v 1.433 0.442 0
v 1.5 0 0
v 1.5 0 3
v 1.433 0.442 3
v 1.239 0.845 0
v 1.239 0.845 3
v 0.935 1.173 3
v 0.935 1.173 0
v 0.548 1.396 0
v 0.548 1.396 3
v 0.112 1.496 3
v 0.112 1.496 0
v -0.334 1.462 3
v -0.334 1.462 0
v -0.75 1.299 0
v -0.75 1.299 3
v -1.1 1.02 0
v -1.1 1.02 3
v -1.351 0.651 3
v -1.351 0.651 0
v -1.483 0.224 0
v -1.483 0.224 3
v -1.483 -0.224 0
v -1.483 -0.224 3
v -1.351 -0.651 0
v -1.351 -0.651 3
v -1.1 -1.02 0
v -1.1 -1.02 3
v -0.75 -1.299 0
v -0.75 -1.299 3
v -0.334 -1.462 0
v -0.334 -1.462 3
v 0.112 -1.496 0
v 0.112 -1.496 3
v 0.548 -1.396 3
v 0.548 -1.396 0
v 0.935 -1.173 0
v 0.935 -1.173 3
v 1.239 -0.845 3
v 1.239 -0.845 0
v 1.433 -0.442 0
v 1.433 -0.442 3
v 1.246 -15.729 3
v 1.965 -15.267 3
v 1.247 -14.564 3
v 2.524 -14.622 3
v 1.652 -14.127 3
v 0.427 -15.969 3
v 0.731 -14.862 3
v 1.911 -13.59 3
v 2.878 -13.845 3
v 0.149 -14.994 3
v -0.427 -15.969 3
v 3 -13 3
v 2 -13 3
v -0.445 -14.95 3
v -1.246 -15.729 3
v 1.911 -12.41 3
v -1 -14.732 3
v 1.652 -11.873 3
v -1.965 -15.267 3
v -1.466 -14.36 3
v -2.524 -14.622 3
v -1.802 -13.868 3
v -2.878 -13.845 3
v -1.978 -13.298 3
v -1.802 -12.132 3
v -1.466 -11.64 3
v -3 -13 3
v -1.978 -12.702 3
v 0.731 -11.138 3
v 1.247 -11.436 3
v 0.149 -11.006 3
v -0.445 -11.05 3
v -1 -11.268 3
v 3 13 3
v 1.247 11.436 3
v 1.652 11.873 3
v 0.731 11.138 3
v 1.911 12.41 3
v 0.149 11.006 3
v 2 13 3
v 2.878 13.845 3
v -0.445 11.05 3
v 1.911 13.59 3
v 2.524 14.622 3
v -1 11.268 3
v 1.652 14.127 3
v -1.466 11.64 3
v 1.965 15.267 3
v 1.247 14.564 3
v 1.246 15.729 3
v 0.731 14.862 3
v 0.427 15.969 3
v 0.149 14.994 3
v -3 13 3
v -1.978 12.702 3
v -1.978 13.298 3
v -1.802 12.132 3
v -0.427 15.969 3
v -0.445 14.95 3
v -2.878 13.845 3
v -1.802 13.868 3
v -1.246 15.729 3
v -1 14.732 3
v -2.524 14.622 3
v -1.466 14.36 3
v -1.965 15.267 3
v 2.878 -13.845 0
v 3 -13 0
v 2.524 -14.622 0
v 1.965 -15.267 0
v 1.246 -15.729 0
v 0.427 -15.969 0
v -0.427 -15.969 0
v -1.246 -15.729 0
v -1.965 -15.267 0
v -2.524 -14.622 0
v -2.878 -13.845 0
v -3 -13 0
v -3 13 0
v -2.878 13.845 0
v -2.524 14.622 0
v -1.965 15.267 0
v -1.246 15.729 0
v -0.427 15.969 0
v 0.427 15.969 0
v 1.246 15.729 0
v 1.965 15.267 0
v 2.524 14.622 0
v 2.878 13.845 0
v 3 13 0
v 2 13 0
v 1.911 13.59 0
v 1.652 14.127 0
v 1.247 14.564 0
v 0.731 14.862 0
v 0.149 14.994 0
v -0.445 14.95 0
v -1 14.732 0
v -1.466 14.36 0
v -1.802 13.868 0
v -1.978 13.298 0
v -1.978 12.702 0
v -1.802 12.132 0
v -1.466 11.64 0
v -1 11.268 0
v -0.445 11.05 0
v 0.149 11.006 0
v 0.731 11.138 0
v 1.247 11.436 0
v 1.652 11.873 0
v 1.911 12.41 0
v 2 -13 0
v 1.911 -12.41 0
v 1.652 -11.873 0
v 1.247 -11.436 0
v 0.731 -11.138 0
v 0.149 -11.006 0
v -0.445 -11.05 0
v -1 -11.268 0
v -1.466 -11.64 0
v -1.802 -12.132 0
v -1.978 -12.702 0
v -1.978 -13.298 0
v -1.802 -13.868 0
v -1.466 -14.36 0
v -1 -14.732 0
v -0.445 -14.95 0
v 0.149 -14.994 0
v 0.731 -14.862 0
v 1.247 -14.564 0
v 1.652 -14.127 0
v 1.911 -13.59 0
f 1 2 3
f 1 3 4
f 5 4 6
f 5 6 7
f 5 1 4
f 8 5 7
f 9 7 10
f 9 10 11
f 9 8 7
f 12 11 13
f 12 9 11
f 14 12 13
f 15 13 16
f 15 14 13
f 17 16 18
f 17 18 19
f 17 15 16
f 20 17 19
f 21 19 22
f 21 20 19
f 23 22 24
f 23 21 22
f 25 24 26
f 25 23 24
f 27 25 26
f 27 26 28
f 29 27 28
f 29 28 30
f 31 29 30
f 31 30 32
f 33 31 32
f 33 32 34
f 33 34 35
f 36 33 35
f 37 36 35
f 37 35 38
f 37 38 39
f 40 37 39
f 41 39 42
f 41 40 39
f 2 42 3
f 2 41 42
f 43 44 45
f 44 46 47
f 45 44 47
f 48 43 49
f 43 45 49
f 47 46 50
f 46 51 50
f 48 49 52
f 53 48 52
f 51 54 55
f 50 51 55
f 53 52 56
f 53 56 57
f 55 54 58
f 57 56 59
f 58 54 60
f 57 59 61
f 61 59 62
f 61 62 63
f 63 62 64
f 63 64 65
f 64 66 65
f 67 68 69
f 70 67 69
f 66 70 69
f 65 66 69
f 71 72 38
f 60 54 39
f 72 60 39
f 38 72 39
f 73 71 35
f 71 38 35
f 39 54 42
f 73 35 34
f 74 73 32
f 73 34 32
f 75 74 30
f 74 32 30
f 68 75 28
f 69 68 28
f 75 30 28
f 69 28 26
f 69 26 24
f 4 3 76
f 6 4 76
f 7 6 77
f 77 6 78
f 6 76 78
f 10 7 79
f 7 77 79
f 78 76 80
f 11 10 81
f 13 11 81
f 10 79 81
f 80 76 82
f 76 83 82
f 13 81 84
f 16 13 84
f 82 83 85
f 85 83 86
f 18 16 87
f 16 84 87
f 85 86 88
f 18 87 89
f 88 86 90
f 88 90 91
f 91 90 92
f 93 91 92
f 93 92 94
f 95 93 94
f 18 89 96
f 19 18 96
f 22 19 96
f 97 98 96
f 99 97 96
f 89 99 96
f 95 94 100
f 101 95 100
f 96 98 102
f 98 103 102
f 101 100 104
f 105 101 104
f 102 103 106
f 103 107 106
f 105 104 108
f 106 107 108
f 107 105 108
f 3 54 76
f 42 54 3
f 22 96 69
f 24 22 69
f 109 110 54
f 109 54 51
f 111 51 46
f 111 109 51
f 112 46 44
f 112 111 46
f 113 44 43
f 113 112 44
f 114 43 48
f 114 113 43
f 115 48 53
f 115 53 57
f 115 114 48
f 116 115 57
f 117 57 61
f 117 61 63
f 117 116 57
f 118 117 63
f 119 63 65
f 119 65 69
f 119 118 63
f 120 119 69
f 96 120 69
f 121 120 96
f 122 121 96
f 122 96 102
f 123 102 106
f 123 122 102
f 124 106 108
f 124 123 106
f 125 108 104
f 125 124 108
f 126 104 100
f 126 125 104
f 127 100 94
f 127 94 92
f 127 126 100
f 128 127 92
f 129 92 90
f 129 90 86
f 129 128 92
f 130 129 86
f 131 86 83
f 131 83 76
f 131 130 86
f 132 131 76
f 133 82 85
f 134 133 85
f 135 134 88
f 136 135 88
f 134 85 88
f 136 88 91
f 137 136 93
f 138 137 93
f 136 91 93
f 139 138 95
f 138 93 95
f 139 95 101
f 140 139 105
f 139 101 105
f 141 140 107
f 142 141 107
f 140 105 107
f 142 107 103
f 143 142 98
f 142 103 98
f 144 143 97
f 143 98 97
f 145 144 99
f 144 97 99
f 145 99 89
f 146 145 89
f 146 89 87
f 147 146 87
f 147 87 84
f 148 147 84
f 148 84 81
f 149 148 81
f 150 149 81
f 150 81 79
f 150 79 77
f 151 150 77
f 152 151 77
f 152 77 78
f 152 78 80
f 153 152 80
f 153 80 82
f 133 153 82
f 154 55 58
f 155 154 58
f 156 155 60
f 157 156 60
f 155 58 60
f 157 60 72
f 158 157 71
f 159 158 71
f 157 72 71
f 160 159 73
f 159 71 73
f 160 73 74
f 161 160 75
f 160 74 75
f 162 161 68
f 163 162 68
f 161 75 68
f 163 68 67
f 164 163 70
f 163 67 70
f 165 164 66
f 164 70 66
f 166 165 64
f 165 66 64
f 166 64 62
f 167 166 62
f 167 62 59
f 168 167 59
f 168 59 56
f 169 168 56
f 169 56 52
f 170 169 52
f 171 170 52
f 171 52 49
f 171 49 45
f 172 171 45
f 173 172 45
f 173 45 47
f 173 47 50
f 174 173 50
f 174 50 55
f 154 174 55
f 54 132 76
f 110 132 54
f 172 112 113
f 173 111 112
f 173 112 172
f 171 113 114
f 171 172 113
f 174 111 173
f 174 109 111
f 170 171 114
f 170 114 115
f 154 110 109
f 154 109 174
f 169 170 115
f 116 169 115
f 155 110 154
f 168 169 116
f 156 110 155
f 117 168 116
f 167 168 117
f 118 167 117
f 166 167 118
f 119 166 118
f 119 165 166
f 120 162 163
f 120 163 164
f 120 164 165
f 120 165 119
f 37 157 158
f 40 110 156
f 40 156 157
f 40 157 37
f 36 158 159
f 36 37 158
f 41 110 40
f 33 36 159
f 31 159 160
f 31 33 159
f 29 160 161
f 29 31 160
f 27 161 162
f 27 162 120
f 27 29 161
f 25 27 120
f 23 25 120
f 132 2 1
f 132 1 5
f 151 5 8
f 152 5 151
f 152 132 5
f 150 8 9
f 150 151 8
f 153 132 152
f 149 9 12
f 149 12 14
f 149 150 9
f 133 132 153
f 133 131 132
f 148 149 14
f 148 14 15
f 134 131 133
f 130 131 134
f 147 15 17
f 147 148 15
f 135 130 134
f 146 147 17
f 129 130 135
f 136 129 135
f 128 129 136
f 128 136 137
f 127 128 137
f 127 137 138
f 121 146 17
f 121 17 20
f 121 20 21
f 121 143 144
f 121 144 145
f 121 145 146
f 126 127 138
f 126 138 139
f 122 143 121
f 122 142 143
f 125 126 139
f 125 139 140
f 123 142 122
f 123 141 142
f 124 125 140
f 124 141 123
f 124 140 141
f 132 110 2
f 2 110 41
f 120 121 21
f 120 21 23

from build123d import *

# Parameters (mm, degrees)
SKETCH1_R           = 1.5
BOSS_EXTRUDE1_DEPTH = 3
SKETCH3_R           = 2
CUT_EXTRUDE2_DEPTH  = 10


with BuildPart() as part:
    # Sketch1 → Boss-Extrude1 (new body)
    with BuildSketch(Plane.XY):
        with BuildLine():
            Line((3, 13), (3, -13))
            ThreePointArc((3, -13), (0, -16), (-3, -13))
            Line((-3, -13), (-3, 13))
            ThreePointArc((-3, 13), (0, 16), (3, 13))
        make_face()
        with Locations((0, 13)):
            Circle(SKETCH1_R, mode=Mode.SUBTRACT)
        with Locations((0, -13)):
            Circle(SKETCH1_R, mode=Mode.SUBTRACT)
        Circle(SKETCH1_R, mode=Mode.SUBTRACT)
    extrude(amount=BOSS_EXTRUDE1_DEPTH)

    # Sketch3 → Cut-Extrude2 (cut)
    with BuildSketch(Plane.XY.offset(3)):
        with Locations((0, -13)):
            Circle(SKETCH3_R)
        with Locations((0, 13)):
            Circle(SKETCH3_R)
    extrude(amount=-CUT_EXTRUDE2_DEPTH, mode=Mode.SUBTRACT)


solid = part.part
